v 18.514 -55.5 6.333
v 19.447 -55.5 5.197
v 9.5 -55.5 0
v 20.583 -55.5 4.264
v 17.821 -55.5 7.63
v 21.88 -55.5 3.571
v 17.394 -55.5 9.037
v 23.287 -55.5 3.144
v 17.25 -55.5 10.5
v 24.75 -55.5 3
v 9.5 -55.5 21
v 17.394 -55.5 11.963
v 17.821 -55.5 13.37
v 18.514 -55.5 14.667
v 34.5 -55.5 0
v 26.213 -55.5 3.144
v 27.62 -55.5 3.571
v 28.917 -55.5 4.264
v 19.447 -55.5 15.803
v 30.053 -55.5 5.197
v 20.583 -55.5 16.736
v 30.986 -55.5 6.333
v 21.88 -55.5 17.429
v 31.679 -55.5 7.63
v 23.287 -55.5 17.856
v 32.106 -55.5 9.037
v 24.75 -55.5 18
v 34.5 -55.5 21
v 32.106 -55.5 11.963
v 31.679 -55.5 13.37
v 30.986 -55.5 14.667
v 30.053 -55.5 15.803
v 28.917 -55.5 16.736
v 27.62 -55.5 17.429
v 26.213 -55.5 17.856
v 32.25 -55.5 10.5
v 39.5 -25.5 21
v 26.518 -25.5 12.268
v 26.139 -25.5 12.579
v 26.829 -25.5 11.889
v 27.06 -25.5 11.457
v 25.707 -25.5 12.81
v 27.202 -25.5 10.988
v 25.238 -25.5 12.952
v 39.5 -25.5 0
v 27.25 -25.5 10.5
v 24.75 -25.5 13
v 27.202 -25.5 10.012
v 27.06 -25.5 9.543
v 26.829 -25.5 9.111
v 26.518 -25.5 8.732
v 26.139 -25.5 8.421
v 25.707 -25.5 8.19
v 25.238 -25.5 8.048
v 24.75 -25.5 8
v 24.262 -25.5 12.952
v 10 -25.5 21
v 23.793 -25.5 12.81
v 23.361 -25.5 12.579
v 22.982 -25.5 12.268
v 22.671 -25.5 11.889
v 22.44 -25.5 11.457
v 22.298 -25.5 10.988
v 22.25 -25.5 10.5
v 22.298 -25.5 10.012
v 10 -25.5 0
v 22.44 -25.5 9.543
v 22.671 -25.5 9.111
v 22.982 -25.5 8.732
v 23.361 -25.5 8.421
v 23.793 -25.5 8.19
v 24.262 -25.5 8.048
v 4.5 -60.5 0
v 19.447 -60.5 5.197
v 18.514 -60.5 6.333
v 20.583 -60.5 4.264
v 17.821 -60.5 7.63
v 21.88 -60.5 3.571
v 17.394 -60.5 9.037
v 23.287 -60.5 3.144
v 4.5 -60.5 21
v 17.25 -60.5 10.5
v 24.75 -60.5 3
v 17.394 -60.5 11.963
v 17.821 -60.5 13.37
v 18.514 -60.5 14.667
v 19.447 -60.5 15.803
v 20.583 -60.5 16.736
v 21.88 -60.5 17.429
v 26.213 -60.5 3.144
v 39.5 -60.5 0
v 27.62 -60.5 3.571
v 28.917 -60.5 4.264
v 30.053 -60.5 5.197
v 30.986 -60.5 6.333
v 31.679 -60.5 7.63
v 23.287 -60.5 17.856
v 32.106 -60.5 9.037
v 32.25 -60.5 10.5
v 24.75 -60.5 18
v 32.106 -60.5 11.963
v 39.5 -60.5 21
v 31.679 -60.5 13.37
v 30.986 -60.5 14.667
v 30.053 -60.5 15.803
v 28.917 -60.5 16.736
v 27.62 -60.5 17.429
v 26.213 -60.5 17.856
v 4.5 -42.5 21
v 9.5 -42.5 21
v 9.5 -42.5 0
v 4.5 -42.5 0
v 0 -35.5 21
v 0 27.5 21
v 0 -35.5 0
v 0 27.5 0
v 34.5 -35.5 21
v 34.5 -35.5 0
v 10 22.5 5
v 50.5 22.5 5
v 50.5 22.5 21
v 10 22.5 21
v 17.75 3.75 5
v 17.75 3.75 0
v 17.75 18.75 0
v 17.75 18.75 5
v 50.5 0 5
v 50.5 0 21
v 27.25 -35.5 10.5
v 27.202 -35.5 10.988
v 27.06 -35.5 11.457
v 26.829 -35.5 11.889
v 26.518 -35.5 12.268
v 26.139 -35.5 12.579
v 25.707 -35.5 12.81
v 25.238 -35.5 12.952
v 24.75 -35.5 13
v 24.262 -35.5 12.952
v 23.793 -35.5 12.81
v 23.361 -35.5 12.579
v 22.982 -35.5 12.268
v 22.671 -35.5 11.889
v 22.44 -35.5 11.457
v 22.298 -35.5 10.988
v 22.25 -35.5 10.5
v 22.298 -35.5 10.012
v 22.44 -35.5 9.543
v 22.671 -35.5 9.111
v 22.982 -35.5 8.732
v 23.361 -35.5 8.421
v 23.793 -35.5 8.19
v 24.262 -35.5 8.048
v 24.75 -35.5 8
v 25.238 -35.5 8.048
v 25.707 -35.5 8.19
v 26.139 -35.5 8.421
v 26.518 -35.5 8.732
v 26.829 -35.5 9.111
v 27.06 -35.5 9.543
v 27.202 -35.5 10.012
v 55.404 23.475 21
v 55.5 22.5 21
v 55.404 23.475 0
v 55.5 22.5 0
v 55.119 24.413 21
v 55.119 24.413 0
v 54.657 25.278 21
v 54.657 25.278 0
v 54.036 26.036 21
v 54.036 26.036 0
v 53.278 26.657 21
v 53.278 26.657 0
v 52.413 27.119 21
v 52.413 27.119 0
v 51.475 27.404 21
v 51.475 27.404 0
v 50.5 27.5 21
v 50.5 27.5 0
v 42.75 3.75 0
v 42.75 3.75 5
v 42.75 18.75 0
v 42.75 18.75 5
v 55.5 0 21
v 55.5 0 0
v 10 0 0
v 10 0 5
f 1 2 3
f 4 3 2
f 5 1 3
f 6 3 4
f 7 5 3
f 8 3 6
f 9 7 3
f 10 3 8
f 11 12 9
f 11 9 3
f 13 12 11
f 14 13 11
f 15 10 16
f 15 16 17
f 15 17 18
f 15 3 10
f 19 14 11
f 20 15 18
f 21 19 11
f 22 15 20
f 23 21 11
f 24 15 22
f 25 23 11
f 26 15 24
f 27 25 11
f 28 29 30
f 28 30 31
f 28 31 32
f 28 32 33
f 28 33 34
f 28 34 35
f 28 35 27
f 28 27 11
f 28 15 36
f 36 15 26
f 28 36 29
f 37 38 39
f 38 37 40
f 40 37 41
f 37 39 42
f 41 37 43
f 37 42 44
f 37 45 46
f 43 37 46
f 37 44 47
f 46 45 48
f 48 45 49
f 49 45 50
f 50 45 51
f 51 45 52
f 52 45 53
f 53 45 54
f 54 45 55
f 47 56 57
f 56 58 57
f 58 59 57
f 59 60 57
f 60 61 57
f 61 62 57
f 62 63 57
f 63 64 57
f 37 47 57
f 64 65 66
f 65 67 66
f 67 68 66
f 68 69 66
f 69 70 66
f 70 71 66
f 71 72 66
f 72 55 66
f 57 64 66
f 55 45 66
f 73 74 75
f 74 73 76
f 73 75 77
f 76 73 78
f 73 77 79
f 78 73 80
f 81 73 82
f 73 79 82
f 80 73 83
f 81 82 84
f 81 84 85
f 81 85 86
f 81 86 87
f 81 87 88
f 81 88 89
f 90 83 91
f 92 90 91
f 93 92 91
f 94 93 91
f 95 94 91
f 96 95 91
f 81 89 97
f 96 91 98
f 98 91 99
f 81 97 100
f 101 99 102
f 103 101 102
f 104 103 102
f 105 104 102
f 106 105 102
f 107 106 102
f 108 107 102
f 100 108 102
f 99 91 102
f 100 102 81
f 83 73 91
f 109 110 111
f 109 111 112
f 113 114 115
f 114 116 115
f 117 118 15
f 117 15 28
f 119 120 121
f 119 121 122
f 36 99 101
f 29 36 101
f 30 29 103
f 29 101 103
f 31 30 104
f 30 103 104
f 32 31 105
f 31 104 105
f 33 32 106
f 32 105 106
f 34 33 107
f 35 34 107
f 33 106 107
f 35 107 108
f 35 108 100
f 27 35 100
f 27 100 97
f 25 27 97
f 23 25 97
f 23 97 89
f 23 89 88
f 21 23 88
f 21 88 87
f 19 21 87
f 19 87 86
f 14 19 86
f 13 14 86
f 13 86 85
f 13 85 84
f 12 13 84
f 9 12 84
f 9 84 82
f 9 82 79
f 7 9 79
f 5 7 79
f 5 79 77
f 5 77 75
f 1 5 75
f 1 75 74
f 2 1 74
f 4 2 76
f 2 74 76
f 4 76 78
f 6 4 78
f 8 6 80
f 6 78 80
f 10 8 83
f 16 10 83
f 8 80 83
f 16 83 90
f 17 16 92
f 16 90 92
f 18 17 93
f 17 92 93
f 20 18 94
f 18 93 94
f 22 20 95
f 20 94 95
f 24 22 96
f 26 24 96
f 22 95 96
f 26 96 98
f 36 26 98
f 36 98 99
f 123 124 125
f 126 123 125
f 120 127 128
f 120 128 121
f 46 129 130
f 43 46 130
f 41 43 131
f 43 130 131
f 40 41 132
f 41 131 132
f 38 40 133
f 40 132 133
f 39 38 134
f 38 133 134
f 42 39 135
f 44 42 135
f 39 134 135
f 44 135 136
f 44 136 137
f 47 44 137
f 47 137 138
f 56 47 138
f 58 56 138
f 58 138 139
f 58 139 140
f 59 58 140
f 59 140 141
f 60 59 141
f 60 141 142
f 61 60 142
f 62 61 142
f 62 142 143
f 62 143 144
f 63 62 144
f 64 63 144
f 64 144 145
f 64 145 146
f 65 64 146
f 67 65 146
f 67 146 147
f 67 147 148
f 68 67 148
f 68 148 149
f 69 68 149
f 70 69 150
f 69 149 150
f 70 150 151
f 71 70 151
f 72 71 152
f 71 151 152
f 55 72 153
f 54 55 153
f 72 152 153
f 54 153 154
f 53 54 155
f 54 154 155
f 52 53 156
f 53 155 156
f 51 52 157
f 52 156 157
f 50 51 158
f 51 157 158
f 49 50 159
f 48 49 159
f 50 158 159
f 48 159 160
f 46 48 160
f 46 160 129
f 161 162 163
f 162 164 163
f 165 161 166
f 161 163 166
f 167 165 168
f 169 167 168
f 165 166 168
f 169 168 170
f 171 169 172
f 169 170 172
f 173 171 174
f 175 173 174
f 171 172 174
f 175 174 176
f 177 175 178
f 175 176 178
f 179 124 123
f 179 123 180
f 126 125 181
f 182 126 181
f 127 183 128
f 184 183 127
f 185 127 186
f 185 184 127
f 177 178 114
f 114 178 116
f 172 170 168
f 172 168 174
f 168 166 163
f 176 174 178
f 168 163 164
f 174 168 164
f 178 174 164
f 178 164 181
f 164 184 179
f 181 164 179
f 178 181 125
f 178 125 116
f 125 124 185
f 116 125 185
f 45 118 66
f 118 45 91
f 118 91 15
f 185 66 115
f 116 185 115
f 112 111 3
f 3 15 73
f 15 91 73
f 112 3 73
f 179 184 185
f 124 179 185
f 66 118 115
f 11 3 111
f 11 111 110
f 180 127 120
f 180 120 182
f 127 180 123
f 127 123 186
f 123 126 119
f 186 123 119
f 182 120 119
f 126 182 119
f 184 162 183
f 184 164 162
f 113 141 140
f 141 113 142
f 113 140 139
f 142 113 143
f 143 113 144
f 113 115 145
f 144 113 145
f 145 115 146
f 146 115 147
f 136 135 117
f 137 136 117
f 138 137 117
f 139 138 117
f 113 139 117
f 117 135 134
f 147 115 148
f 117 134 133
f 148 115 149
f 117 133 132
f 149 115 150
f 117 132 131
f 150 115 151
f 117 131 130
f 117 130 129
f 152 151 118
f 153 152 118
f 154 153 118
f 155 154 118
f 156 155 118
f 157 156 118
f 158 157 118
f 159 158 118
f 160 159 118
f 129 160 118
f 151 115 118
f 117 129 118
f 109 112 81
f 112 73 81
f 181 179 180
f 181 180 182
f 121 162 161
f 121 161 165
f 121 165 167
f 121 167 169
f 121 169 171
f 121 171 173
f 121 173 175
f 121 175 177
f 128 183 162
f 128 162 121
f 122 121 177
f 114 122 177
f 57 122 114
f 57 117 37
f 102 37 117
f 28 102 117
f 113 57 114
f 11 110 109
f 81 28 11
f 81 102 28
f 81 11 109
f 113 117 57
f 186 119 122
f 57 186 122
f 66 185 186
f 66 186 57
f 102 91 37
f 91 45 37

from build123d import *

# Parameters (mm, degrees)
SKETCH_W        = 25
SKETCH_H        = 15
PAD_DEPTH       = 5
PAD001_DEPTH    = 16
SKETCH002_R     = 2.5
SKETCH002_W     = 16
SKETCH002_H     = 21
POCKET_DEPTH    = 15
SKETCH003_W     = 5
SKETCH003_H     = 21
PAD002_DEPTH    = 25
SKETCH004_W     = 5
SKETCH004_H     = 21
PAD003_DEPTH    = 30
SKETCH005_W     = 5
SKETCH005_H     = 21
PAD004_DEPTH    = 13
SKETCH006_R     = 7.5
POCKET001_DEPTH = 10


with BuildPart() as part:
    # Sketch → Pad (new body)
    with BuildSketch(Plane.XY):
        with BuildLine():
            Line((0, -35.5), (0, 27.5))
            Line((0, 27.5), (50.5, 27.5))
            ThreePointArc((55.5, 22.5), (54.035534, 26.035534), (50.5, 27.5))
            Line((55.5, 22.5), (55.5, 0))
            Line((55.5, 0), (10, 0))
            Line((10, 0), (10, -25.5))
            Line((10, -25.5), (55.5, -25.5))
            Line((55.5, -25.5), (55.5, -35.5))
            Line((55.5, -35.5), (0, -35.5))
        make_face()
        with Locations((30.25, 11.25)):
            Rectangle(SKETCH_W, SKETCH_H, mode=Mode.SUBTRACT)
    extrude(amount=PAD_DEPTH)

    # Sketch001 (on Face15 of Pad) → Pad001 (join)
    with BuildSketch(Plane.XY.offset(5)):
        with BuildLine():
            Line((55.5, 22.5), (55.5, 0))
            Line((55.5, 0), (50.5, 0))
            Line((50.5, 0), (50.5, 22.5))
            Line((50.5, 22.5), (10, 22.5))
            Line((10, 22.5), (10, -25.5))
            Line((55.5, -25.5), (10, -25.5))
            Line((55.5, -35.5), (55.5, -25.5))
            Line((0, -35.5), (55.5, -35.5))
            Line((0, 27.5), (0, -35.5))
            Line((50.5, 27.5), (0, 27.5))
            ThreePointArc((55.5, 22.5), (54.035534, 26.035534), (50.5, 27.5))
        make_face()
    extrude(amount=PAD001_DEPTH)

    # Sketch002 (on Face26 of Pad001) → Pocket (cut)
    with BuildSketch(Plane.XZ.offset(35.5)):
        with Locations((24.75, 10.5)):
            Circle(SKETCH002_R)
        with Locations((47.5, 10.5)):
            Rectangle(SKETCH002_W, SKETCH002_H)
    extrude(amount=-POCKET_DEPTH, mode=Mode.SUBTRACT)

    # Sketch003 (on Face25 of Pocket) → Pad002 (join)
    with BuildSketch(Plane.XZ.offset(35.5)):
        with Locations((37, 10.5)):
            Rectangle(SKETCH003_W, SKETCH003_H)
    extrude(amount=PAD002_DEPTH)

    # Sketch004 (on Face27 of Pad002) → Pad003 (join)
    with BuildSketch(Plane(origin=(34.5, 0, 0), x_dir=(0, -1, 0), z_dir=(-1, 0, 0))):
        with Locations((58, 10.5)):
            Rectangle(SKETCH004_W, SKETCH004_H)
    extrude(amount=PAD003_DEPTH)

    # Sketch005 (on Face34 of Pad003) → Pad004 (join)
    with BuildSketch(Plane(origin=(0, -55.5, 0), x_dir=(-1, 0, 0), z_dir=(0, 1, 0))):
        with Locations((-7, 10.5)):
            Rectangle(SKETCH005_W, SKETCH005_H)
    extrude(amount=PAD004_DEPTH)

    # Sketch006 (on Face36 of Pad004) → Pocket001 (cut)
    with BuildSketch(Plane.XZ.offset(60.5)):
        with Locations((24.75, 10.5)):
            Circle(SKETCH006_R)
    extrude(amount=-POCKET001_DEPTH, mode=Mode.SUBTRACT)


solid = part.part
